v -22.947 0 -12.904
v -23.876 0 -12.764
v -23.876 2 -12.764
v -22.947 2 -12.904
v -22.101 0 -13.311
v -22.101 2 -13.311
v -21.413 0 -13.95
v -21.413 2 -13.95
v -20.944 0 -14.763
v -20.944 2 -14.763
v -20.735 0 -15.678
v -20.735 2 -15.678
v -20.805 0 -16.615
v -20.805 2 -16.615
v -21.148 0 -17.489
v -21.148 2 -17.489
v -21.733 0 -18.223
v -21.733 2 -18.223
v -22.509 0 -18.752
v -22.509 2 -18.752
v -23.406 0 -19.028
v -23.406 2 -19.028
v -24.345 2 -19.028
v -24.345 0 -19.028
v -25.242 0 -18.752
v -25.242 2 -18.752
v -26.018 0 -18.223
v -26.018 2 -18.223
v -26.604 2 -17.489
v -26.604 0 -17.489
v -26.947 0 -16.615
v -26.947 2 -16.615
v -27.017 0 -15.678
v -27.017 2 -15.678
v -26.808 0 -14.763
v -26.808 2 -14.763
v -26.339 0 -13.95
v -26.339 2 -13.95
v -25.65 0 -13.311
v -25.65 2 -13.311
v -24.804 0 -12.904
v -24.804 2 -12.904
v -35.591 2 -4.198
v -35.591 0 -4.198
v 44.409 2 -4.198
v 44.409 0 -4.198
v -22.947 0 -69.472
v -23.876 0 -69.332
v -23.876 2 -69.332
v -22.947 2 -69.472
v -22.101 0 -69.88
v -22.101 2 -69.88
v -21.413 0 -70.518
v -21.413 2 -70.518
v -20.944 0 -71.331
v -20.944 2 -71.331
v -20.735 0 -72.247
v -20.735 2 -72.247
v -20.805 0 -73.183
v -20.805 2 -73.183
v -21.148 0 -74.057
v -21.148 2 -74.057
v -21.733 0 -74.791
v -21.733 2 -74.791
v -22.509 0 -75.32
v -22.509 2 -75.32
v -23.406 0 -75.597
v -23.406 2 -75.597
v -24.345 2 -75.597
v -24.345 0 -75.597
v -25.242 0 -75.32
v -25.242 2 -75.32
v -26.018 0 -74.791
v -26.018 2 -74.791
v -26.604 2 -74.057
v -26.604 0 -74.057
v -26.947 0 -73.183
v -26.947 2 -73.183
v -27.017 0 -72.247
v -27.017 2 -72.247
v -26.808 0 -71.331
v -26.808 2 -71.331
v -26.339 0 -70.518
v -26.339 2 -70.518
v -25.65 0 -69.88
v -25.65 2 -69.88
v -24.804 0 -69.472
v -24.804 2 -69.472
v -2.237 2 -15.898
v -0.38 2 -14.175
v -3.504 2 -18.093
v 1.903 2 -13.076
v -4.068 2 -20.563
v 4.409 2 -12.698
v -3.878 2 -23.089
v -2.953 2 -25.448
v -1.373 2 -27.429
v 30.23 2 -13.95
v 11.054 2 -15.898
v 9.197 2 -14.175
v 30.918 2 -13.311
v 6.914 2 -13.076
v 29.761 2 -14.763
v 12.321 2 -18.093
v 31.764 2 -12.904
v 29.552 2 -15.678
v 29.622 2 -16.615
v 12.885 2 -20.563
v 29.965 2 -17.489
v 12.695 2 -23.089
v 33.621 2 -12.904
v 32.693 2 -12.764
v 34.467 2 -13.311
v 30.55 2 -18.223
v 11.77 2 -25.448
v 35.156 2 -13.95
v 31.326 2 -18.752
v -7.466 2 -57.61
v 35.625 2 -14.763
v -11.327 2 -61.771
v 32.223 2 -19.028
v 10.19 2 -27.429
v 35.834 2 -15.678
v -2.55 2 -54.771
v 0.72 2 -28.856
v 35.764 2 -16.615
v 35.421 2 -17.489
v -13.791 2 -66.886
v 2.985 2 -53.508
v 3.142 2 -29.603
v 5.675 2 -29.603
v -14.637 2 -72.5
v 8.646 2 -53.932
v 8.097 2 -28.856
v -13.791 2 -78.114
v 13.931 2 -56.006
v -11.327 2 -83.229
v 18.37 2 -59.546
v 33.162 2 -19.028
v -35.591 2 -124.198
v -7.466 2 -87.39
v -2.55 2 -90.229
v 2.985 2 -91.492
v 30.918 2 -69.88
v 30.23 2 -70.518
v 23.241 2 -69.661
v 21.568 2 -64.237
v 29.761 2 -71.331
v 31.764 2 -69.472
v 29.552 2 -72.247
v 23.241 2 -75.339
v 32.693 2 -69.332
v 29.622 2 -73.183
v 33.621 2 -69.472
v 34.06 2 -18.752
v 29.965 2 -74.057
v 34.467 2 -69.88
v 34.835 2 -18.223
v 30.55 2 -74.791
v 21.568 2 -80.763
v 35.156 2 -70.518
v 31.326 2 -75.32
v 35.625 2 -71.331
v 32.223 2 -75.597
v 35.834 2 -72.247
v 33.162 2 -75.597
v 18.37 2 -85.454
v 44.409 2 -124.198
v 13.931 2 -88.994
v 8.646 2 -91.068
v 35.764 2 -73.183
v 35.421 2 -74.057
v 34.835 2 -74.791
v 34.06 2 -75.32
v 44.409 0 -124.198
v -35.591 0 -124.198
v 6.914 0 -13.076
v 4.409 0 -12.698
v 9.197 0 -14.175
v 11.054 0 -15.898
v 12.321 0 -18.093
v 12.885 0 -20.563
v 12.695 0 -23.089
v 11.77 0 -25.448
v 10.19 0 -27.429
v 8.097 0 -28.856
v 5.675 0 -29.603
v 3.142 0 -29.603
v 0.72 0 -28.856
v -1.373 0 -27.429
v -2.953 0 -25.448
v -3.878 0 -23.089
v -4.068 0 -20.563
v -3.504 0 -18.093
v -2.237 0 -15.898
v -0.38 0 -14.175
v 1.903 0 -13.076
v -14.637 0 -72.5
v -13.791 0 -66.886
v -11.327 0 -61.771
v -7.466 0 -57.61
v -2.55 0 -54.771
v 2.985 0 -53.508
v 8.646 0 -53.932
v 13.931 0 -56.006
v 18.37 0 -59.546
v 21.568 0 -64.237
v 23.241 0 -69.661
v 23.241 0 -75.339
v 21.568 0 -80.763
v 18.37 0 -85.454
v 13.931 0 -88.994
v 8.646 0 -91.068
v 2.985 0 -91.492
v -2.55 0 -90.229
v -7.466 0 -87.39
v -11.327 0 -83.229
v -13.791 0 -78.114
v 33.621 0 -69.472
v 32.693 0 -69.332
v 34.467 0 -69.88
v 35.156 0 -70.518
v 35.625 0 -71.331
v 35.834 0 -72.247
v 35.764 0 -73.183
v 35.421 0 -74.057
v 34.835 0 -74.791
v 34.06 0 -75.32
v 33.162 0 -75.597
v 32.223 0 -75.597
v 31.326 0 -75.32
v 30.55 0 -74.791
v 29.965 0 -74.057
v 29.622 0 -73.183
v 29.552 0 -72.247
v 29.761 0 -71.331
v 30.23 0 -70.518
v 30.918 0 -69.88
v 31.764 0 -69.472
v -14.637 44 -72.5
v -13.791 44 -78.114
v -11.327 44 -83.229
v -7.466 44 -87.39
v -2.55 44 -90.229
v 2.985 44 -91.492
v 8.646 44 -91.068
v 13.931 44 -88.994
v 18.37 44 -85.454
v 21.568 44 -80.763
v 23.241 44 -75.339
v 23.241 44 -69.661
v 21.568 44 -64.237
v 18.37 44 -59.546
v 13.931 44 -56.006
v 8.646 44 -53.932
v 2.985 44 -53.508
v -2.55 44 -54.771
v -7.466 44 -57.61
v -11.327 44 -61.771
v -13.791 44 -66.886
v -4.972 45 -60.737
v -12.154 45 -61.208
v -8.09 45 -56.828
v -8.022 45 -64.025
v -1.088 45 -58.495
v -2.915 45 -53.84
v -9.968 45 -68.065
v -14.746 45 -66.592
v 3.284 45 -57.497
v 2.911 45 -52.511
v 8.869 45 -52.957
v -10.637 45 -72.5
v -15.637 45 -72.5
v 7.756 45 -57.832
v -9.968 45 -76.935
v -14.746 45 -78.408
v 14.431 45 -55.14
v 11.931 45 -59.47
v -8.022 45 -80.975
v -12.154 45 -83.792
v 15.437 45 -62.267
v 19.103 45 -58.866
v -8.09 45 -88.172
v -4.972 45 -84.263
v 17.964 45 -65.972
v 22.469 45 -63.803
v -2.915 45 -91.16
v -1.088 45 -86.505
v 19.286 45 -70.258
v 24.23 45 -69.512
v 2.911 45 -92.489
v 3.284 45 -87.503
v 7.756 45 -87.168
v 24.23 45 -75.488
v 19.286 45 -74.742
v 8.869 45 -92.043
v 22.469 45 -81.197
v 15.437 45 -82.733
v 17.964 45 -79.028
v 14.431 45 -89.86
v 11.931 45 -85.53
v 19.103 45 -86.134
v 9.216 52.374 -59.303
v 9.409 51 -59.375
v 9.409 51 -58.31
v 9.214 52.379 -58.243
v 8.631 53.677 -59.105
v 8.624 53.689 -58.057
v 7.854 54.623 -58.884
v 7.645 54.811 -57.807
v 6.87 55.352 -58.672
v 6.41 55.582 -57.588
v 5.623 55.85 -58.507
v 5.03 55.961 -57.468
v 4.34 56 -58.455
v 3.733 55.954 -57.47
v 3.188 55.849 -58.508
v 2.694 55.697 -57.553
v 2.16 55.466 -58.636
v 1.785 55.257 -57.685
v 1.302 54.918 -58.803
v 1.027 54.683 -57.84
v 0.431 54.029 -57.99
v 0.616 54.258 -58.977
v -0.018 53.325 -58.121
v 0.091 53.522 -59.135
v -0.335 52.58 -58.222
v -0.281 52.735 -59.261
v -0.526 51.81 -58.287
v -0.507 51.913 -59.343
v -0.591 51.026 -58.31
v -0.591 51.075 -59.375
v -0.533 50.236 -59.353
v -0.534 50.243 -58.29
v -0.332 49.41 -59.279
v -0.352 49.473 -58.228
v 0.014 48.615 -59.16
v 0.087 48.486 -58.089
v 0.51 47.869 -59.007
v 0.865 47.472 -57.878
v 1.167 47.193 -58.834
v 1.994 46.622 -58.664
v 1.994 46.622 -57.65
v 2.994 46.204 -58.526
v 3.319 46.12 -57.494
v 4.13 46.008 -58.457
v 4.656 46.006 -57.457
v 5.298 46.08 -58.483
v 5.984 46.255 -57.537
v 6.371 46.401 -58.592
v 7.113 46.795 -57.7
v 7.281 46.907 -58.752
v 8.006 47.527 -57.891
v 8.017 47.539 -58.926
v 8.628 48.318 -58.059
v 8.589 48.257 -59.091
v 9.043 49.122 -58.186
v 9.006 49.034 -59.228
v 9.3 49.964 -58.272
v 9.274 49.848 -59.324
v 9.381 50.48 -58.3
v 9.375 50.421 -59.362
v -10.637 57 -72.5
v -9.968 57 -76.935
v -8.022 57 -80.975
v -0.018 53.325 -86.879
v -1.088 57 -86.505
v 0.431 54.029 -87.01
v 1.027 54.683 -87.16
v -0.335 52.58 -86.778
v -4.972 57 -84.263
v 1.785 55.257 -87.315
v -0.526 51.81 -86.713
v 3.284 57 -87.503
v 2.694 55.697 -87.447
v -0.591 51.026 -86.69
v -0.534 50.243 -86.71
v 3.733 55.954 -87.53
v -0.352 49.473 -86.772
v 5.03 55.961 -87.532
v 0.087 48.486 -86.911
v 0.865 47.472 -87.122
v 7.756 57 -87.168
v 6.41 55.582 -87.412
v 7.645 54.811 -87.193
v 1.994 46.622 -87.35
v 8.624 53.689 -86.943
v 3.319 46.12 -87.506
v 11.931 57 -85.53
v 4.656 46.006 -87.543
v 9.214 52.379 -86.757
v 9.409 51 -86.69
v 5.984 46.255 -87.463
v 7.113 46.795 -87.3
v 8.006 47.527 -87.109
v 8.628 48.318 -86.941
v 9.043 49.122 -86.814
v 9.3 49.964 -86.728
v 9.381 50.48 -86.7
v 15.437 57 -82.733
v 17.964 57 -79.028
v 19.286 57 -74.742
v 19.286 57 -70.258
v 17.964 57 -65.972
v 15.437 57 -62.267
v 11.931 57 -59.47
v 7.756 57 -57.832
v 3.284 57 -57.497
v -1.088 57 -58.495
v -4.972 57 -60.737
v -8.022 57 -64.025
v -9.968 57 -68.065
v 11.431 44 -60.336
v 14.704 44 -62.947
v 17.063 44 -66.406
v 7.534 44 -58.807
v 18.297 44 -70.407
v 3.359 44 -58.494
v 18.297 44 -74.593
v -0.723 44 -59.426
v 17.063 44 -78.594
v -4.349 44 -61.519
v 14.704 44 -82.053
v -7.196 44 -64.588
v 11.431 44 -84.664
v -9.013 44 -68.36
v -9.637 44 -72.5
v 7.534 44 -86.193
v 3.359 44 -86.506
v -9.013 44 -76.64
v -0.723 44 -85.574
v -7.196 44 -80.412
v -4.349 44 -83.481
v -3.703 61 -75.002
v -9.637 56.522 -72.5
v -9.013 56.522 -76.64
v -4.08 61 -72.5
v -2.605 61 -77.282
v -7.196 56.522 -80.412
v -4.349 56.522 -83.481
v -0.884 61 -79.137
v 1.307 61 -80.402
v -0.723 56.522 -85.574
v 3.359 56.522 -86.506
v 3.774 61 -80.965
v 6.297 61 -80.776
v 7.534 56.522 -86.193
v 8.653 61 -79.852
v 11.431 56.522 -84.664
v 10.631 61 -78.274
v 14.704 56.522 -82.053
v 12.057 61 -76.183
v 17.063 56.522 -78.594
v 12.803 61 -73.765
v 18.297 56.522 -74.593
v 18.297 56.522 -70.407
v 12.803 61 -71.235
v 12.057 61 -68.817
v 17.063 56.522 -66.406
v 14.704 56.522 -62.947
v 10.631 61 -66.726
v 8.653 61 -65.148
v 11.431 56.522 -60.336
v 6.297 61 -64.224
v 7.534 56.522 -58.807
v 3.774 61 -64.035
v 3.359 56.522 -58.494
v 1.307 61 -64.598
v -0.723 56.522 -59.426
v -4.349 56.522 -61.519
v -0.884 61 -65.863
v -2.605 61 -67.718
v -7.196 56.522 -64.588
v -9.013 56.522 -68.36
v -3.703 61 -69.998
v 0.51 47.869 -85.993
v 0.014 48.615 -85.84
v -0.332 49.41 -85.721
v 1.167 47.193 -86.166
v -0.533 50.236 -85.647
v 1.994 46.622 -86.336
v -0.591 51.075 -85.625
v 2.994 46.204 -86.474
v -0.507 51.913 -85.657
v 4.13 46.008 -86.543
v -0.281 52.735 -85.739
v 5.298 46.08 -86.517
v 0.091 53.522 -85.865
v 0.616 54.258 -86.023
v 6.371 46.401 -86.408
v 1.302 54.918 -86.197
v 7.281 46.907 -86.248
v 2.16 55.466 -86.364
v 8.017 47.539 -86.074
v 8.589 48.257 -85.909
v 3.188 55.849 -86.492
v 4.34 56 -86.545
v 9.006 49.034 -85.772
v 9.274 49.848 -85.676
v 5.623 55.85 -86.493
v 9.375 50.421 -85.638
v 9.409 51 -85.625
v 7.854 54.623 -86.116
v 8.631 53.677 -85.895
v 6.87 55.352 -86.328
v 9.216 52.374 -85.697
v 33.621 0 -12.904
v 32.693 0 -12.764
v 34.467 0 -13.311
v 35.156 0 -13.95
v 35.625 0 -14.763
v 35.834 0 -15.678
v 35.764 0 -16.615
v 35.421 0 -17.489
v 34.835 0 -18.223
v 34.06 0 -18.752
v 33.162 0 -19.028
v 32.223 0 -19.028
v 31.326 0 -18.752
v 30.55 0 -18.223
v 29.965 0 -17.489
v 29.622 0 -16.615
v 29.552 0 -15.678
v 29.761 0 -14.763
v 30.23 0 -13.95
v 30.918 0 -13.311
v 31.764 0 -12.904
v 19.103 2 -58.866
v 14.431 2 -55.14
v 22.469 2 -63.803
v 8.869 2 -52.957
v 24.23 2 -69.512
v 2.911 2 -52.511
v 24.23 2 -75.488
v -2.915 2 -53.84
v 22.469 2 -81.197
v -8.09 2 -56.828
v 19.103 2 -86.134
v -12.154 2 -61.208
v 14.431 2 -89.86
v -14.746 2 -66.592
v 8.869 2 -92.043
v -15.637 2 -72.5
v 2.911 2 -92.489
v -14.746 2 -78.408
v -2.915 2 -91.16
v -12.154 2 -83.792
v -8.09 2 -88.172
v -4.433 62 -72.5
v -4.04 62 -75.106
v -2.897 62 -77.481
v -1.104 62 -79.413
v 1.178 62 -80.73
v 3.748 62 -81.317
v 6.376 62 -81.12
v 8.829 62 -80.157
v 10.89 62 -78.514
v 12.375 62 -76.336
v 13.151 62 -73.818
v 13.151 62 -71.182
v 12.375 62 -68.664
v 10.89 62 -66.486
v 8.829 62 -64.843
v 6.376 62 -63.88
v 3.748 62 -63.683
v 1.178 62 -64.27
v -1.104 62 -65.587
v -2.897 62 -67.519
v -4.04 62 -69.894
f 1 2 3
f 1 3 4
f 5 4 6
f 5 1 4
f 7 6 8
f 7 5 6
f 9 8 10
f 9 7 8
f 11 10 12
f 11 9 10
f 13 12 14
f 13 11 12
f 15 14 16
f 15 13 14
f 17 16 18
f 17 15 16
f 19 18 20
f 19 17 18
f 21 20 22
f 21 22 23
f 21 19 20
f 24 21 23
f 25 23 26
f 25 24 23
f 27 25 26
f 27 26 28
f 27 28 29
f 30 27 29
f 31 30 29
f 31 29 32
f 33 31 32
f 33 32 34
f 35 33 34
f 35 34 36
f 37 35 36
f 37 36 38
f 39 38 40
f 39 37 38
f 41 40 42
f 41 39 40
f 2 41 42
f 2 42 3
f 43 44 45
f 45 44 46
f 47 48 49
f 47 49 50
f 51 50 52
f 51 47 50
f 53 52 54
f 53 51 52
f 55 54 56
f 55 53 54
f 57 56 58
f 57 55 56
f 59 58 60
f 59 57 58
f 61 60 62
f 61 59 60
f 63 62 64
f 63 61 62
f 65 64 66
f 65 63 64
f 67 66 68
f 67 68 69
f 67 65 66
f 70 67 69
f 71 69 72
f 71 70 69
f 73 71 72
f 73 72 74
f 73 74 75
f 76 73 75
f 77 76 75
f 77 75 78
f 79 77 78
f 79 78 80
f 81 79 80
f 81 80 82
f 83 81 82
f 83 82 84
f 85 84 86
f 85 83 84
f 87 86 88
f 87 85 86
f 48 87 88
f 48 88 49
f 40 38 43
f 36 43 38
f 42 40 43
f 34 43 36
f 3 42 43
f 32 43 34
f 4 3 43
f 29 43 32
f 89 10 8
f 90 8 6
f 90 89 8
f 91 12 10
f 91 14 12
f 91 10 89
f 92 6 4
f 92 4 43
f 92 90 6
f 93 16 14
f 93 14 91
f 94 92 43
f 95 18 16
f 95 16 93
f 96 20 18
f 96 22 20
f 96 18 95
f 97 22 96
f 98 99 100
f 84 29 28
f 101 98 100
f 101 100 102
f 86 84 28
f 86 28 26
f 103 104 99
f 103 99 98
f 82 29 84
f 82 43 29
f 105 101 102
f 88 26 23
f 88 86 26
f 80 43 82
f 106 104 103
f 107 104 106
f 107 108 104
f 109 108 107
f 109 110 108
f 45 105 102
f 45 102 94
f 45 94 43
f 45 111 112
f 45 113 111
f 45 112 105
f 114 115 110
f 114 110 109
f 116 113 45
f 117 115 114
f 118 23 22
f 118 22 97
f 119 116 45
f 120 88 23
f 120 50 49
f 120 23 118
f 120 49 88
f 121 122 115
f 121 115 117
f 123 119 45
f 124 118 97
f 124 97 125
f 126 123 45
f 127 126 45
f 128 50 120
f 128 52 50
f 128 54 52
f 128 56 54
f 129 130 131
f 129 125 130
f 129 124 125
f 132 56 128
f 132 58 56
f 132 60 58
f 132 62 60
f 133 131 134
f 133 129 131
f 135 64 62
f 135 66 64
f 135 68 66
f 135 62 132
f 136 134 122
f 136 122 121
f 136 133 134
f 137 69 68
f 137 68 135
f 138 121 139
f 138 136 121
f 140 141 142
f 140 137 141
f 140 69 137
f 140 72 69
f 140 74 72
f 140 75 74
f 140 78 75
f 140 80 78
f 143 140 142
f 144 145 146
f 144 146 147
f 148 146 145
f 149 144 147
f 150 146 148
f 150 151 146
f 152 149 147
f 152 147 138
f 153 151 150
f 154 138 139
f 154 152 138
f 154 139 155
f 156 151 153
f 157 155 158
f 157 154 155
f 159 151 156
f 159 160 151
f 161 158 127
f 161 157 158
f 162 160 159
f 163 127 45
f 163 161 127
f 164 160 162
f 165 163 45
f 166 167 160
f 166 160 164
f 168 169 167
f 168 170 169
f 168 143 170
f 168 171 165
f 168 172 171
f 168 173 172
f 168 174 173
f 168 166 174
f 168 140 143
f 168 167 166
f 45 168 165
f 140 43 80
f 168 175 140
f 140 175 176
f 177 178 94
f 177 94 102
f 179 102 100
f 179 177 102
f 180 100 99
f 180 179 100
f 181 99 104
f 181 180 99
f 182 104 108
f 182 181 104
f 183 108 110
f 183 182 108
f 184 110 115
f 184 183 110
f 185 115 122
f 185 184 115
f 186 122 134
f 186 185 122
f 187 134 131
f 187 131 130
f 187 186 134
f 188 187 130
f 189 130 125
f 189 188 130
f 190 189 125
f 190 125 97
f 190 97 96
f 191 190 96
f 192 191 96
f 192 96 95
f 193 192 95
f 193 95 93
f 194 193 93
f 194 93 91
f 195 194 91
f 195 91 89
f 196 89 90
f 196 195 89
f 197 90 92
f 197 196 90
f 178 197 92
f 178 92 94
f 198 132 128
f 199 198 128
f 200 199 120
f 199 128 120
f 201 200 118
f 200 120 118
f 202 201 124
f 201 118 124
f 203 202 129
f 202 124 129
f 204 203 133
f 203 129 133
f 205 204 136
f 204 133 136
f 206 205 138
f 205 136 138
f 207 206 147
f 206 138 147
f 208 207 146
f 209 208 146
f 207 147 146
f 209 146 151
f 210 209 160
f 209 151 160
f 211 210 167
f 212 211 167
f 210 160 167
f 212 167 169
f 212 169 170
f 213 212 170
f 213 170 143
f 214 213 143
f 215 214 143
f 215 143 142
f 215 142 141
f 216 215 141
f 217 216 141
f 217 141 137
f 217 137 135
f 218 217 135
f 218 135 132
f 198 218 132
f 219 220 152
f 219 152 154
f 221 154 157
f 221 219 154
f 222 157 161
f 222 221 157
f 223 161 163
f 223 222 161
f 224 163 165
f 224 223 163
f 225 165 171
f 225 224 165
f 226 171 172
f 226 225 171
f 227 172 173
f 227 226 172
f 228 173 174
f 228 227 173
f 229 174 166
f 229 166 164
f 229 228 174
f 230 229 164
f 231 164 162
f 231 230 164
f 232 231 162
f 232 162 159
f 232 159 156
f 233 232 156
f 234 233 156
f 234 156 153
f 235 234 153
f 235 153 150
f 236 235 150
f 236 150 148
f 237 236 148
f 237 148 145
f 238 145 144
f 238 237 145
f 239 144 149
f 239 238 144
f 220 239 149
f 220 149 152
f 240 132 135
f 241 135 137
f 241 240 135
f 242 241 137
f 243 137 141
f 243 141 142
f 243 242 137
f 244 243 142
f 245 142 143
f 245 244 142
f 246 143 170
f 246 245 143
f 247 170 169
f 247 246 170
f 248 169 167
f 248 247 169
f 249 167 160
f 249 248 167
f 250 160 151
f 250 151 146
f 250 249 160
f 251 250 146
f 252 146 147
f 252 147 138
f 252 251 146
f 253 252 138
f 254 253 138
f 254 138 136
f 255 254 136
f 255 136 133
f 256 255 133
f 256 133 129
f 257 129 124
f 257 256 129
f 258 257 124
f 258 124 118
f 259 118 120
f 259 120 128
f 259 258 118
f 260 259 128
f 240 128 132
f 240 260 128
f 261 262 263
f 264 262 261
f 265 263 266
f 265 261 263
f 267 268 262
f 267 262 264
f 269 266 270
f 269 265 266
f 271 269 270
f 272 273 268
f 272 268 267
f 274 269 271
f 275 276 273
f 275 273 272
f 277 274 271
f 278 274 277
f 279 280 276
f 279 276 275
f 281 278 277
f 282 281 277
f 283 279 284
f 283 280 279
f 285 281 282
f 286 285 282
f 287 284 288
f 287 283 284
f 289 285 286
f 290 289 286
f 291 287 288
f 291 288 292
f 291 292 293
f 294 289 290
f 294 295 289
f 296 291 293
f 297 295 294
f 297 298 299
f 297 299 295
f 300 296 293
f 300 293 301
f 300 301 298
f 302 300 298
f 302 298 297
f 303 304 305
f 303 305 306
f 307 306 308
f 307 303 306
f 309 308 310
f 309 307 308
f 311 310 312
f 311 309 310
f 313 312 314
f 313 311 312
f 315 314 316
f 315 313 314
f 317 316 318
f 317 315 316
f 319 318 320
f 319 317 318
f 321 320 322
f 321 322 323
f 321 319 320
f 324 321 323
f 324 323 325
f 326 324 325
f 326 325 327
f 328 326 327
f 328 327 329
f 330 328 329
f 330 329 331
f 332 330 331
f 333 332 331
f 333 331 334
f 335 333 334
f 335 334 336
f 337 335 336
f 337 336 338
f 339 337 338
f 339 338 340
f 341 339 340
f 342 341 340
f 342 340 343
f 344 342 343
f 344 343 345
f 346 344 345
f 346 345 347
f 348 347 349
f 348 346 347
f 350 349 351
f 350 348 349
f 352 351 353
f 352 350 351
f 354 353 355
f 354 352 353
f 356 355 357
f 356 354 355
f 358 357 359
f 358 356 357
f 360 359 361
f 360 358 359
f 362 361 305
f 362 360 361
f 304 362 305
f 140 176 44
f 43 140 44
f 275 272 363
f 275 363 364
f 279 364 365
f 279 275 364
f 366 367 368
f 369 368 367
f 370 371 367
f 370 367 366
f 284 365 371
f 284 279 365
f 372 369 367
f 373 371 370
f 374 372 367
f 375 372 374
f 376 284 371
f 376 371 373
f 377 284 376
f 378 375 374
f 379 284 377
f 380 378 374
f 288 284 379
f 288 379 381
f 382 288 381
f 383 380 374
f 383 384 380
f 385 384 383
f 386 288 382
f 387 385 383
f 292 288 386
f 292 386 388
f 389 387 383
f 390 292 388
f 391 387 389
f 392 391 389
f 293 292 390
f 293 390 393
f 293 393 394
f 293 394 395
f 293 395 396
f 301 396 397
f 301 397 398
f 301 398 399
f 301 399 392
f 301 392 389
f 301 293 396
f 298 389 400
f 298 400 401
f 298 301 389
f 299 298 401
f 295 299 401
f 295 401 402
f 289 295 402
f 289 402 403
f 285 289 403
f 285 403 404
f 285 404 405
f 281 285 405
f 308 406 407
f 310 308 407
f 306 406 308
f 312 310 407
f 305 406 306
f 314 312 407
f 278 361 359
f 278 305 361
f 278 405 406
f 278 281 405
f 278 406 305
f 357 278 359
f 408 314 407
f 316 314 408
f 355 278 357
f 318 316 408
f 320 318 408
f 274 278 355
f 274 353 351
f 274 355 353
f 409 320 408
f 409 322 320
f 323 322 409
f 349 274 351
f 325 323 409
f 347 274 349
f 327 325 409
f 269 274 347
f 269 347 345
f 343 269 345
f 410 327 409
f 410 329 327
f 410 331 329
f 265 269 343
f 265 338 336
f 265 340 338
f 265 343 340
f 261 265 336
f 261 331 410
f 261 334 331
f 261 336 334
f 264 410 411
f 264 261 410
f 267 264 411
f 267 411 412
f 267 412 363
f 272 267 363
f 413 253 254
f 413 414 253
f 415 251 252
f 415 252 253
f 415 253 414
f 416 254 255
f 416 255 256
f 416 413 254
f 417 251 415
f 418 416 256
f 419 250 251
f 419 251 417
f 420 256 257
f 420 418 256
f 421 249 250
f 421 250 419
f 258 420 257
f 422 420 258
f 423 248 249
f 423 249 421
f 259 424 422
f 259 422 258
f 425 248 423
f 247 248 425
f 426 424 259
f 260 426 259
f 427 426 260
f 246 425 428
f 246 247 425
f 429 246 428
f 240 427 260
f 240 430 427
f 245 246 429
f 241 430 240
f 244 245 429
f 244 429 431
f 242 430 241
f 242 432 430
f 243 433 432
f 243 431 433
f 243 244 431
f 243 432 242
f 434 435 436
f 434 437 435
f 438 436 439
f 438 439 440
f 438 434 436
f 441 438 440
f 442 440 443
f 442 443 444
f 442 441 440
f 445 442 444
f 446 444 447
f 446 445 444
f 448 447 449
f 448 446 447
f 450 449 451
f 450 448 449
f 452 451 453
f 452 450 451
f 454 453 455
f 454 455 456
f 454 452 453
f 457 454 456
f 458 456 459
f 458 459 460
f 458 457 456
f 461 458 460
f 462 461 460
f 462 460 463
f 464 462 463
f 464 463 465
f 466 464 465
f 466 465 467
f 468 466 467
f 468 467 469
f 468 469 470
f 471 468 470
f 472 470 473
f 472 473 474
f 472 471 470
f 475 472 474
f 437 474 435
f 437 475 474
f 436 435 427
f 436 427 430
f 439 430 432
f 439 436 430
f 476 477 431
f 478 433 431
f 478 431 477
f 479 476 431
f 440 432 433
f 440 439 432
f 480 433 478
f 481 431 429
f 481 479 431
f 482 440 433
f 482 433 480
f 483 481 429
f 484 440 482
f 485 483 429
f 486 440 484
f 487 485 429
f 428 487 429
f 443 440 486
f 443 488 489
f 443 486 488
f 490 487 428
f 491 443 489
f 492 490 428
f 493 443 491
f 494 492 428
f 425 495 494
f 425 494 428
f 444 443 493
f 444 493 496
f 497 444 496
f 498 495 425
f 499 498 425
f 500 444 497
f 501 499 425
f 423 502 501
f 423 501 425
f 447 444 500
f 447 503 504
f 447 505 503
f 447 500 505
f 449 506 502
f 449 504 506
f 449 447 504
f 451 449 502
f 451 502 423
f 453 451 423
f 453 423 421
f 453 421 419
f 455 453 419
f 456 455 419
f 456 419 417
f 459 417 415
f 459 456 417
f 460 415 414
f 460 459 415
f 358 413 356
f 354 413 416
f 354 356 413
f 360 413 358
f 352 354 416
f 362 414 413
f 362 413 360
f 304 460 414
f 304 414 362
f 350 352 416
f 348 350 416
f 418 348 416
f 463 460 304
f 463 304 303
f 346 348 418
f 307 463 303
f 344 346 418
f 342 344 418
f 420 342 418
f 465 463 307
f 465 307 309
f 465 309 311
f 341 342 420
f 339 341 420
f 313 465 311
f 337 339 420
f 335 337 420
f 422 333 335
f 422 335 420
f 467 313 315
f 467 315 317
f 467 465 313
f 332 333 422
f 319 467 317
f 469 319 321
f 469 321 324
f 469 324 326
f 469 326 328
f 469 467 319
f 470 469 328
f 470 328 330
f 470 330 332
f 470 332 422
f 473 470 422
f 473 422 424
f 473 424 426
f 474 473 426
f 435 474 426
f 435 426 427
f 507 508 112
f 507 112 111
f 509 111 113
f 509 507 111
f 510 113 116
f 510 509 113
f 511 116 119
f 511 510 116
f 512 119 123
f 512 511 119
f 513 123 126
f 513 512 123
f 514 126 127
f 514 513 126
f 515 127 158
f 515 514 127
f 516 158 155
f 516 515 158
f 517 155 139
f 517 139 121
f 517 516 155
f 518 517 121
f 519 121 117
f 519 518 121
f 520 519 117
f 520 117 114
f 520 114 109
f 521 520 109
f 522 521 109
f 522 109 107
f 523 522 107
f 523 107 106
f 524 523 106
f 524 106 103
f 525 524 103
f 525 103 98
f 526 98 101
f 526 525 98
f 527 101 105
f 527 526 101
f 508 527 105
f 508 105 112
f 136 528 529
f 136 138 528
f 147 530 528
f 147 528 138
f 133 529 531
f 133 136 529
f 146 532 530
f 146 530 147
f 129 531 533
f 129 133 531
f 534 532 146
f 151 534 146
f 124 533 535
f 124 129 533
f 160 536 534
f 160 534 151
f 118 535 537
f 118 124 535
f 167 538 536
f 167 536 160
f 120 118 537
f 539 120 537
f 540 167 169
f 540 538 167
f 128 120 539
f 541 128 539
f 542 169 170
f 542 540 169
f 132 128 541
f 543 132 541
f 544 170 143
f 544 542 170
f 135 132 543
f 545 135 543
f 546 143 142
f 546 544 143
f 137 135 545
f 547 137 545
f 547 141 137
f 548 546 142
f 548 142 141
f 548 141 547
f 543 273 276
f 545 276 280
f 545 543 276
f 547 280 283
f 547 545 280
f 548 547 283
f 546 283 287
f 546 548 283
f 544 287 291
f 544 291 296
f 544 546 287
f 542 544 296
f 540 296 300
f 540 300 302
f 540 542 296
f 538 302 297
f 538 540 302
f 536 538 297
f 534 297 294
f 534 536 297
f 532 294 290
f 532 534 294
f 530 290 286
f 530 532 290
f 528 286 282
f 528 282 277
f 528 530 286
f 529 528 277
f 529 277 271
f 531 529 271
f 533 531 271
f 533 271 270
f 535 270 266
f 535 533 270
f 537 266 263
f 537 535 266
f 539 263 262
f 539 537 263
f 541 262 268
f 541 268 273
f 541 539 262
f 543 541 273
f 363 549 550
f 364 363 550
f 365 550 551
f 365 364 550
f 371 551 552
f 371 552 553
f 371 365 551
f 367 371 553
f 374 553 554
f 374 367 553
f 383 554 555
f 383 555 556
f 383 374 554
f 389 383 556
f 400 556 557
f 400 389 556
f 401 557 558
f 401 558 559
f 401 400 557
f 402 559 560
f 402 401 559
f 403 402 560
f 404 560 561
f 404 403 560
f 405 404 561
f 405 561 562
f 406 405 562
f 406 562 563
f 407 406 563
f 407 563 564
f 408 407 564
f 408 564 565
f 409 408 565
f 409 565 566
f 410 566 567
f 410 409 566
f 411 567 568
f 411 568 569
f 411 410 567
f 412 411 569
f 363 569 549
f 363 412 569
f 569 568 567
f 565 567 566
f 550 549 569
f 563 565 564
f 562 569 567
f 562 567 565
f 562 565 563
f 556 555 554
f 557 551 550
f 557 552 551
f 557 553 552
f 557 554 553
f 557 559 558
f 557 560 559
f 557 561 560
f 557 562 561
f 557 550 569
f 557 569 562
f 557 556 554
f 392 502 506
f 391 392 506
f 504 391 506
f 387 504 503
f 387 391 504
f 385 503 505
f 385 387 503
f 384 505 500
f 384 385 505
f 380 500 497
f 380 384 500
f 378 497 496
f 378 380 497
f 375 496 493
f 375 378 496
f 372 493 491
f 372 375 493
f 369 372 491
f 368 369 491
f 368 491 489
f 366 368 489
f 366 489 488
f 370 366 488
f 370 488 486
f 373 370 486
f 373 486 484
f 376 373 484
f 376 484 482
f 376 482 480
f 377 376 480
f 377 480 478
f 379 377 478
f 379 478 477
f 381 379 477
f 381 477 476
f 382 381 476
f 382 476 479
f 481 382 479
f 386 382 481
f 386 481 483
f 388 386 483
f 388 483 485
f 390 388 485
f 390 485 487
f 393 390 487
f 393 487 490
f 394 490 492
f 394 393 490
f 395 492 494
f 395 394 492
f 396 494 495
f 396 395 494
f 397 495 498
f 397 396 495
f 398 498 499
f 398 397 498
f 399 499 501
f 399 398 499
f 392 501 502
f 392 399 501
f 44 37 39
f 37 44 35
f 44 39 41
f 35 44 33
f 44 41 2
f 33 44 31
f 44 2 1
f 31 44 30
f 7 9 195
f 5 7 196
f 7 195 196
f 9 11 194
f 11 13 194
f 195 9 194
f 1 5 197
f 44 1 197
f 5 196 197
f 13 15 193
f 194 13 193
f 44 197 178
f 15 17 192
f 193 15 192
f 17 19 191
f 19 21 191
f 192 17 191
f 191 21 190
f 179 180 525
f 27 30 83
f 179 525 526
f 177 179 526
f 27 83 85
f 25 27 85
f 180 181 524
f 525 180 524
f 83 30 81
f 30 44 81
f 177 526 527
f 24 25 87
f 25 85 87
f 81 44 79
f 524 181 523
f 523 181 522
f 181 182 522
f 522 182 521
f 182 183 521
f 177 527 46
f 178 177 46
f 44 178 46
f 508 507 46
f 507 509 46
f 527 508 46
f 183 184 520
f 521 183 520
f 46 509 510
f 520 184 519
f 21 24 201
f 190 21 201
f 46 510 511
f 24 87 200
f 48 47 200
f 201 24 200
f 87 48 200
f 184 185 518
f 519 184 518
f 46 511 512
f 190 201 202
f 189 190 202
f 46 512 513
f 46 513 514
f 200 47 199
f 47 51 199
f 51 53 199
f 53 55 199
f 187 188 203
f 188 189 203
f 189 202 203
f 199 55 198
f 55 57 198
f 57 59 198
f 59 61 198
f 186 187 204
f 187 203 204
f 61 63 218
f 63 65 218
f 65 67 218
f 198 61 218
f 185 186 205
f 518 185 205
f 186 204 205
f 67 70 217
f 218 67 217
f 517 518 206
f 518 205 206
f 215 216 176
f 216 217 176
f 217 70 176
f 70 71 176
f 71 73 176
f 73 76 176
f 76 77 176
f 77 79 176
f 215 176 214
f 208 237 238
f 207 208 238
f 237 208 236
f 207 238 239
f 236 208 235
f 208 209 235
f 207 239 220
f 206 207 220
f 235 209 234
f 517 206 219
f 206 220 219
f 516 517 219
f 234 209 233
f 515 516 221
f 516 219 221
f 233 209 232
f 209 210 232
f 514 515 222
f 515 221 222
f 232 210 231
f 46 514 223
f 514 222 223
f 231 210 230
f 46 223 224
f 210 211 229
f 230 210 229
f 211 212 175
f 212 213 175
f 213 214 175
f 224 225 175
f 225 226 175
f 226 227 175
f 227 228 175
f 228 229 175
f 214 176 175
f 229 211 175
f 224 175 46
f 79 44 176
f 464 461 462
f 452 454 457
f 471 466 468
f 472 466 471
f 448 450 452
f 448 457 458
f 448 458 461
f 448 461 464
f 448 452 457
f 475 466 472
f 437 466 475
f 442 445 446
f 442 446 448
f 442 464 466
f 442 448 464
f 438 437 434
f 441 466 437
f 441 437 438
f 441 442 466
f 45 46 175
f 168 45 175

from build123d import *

# Parameters (mm, degrees)
SKETCH1_R               = 3.15
SKETCH1_R_2             = 8.5
BOSS_EXTRUDE1_DEPTH     = 2
CUT_EXTRUDE1_DEPTH      = 103.378146357
CUT_EXTRUDE1_DEPTH_BACK = 103.378146357
SKETCH3_R               = 5
SKETCH4_R               = 19.045268753
CUT_EXTRUDE2_DEPTH      = 145.904268766


with BuildPart() as part:
    # Sketch1 → Boss-Extrude1 (new body)
    with BuildSketch(Plane(origin=(0, 0, 0), x_dir=(1, 0, 0), z_dir=(0, 1, 0))):
        Polygon((-35.591494606, 84.19795391), (-35.591494606, 4.19795391), (44.408505394, 4.19795391), (44.408505394, 84.19795391), (44.408505394, 124.19795391), (-35.591494606, 124.19795391), align=None)
        with Locations(Location((-23.875765854, 72.482225157, 0), (0, 0, 270))):
            Circle(SKETCH1_R, mode=Mode.SUBTRACT)
        with Locations(Location((4.408505394, 21.19795391, 0), (0, 0, 270))):
            Circle(SKETCH1_R_2, mode=Mode.SUBTRACT)
        with Locations(Location((32.692776641, 72.482225157, 0), (0, 0, 270))):
            Circle(SKETCH1_R, mode=Mode.SUBTRACT)
        with Locations(Location((-23.875765854, 15.913682662, 0), (0, 0, 270))):
            Circle(SKETCH1_R, mode=Mode.SUBTRACT)
        with Locations(Location((32.692776641, 15.913682662, 0), (0, 0, 270))):
            Circle(SKETCH1_R, mode=Mode.SUBTRACT)
    extrude(amount=BOSS_EXTRUDE1_DEPTH)

    # Sketch4 → Cut-Extrude2 (cut, through all)
    with BuildSketch(Plane(origin=(0, 2, 0), x_dir=(1, 0, 0), z_dir=(0, 1, 0))):
        with Locations(Location((4.408505394, 72.5, 0), (0, 0, 180))):
            Circle(SKETCH4_R)
    extrude(amount=-CUT_EXTRUDE2_DEPTH, mode=Mode.SUBTRACT)


with BuildPart() as body_2:
    # Sketch2 → Revolve1 (revolve)
    with BuildSketch(Plane.XY.offset(-72.5), mode=Mode.PRIVATE) as revolve1_sk:
        Polygon((4.408505394, 62), (13.250142643, 62), (19.453774147, 57), (19.453774147, 45), (24.453774147, 45), (24.453774147, 2), (23.453774147, 2), (23.453774147, 44), (18.453774147, 44), (18.453774147, 56.521610812), (12.897318897, 61), (4.408505394, 61), align=None)
    revolve(revolve1_sk.sketch.rotate(Axis((4.408505394, 20.129467617, -72.5), (0, -1, 0)), 180), axis=Axis((4.408505394, 20.129467617, -72.5), (0, -1, 0)))

    # Sketch3 → Cut-Extrude1 (cut, two sides: drawn at the far end of the back side and taken through both)
    with BuildSketch(Plane.XY.offset(-72.5).offset(-CUT_EXTRUDE1_DEPTH_BACK)):
        with Locations((4.408505394, 51)):
            Circle(SKETCH3_R)
    extrude(amount=CUT_EXTRUDE1_DEPTH + CUT_EXTRUDE1_DEPTH_BACK, mode=Mode.SUBTRACT)


solid = Compound([part.part, body_2.part])
